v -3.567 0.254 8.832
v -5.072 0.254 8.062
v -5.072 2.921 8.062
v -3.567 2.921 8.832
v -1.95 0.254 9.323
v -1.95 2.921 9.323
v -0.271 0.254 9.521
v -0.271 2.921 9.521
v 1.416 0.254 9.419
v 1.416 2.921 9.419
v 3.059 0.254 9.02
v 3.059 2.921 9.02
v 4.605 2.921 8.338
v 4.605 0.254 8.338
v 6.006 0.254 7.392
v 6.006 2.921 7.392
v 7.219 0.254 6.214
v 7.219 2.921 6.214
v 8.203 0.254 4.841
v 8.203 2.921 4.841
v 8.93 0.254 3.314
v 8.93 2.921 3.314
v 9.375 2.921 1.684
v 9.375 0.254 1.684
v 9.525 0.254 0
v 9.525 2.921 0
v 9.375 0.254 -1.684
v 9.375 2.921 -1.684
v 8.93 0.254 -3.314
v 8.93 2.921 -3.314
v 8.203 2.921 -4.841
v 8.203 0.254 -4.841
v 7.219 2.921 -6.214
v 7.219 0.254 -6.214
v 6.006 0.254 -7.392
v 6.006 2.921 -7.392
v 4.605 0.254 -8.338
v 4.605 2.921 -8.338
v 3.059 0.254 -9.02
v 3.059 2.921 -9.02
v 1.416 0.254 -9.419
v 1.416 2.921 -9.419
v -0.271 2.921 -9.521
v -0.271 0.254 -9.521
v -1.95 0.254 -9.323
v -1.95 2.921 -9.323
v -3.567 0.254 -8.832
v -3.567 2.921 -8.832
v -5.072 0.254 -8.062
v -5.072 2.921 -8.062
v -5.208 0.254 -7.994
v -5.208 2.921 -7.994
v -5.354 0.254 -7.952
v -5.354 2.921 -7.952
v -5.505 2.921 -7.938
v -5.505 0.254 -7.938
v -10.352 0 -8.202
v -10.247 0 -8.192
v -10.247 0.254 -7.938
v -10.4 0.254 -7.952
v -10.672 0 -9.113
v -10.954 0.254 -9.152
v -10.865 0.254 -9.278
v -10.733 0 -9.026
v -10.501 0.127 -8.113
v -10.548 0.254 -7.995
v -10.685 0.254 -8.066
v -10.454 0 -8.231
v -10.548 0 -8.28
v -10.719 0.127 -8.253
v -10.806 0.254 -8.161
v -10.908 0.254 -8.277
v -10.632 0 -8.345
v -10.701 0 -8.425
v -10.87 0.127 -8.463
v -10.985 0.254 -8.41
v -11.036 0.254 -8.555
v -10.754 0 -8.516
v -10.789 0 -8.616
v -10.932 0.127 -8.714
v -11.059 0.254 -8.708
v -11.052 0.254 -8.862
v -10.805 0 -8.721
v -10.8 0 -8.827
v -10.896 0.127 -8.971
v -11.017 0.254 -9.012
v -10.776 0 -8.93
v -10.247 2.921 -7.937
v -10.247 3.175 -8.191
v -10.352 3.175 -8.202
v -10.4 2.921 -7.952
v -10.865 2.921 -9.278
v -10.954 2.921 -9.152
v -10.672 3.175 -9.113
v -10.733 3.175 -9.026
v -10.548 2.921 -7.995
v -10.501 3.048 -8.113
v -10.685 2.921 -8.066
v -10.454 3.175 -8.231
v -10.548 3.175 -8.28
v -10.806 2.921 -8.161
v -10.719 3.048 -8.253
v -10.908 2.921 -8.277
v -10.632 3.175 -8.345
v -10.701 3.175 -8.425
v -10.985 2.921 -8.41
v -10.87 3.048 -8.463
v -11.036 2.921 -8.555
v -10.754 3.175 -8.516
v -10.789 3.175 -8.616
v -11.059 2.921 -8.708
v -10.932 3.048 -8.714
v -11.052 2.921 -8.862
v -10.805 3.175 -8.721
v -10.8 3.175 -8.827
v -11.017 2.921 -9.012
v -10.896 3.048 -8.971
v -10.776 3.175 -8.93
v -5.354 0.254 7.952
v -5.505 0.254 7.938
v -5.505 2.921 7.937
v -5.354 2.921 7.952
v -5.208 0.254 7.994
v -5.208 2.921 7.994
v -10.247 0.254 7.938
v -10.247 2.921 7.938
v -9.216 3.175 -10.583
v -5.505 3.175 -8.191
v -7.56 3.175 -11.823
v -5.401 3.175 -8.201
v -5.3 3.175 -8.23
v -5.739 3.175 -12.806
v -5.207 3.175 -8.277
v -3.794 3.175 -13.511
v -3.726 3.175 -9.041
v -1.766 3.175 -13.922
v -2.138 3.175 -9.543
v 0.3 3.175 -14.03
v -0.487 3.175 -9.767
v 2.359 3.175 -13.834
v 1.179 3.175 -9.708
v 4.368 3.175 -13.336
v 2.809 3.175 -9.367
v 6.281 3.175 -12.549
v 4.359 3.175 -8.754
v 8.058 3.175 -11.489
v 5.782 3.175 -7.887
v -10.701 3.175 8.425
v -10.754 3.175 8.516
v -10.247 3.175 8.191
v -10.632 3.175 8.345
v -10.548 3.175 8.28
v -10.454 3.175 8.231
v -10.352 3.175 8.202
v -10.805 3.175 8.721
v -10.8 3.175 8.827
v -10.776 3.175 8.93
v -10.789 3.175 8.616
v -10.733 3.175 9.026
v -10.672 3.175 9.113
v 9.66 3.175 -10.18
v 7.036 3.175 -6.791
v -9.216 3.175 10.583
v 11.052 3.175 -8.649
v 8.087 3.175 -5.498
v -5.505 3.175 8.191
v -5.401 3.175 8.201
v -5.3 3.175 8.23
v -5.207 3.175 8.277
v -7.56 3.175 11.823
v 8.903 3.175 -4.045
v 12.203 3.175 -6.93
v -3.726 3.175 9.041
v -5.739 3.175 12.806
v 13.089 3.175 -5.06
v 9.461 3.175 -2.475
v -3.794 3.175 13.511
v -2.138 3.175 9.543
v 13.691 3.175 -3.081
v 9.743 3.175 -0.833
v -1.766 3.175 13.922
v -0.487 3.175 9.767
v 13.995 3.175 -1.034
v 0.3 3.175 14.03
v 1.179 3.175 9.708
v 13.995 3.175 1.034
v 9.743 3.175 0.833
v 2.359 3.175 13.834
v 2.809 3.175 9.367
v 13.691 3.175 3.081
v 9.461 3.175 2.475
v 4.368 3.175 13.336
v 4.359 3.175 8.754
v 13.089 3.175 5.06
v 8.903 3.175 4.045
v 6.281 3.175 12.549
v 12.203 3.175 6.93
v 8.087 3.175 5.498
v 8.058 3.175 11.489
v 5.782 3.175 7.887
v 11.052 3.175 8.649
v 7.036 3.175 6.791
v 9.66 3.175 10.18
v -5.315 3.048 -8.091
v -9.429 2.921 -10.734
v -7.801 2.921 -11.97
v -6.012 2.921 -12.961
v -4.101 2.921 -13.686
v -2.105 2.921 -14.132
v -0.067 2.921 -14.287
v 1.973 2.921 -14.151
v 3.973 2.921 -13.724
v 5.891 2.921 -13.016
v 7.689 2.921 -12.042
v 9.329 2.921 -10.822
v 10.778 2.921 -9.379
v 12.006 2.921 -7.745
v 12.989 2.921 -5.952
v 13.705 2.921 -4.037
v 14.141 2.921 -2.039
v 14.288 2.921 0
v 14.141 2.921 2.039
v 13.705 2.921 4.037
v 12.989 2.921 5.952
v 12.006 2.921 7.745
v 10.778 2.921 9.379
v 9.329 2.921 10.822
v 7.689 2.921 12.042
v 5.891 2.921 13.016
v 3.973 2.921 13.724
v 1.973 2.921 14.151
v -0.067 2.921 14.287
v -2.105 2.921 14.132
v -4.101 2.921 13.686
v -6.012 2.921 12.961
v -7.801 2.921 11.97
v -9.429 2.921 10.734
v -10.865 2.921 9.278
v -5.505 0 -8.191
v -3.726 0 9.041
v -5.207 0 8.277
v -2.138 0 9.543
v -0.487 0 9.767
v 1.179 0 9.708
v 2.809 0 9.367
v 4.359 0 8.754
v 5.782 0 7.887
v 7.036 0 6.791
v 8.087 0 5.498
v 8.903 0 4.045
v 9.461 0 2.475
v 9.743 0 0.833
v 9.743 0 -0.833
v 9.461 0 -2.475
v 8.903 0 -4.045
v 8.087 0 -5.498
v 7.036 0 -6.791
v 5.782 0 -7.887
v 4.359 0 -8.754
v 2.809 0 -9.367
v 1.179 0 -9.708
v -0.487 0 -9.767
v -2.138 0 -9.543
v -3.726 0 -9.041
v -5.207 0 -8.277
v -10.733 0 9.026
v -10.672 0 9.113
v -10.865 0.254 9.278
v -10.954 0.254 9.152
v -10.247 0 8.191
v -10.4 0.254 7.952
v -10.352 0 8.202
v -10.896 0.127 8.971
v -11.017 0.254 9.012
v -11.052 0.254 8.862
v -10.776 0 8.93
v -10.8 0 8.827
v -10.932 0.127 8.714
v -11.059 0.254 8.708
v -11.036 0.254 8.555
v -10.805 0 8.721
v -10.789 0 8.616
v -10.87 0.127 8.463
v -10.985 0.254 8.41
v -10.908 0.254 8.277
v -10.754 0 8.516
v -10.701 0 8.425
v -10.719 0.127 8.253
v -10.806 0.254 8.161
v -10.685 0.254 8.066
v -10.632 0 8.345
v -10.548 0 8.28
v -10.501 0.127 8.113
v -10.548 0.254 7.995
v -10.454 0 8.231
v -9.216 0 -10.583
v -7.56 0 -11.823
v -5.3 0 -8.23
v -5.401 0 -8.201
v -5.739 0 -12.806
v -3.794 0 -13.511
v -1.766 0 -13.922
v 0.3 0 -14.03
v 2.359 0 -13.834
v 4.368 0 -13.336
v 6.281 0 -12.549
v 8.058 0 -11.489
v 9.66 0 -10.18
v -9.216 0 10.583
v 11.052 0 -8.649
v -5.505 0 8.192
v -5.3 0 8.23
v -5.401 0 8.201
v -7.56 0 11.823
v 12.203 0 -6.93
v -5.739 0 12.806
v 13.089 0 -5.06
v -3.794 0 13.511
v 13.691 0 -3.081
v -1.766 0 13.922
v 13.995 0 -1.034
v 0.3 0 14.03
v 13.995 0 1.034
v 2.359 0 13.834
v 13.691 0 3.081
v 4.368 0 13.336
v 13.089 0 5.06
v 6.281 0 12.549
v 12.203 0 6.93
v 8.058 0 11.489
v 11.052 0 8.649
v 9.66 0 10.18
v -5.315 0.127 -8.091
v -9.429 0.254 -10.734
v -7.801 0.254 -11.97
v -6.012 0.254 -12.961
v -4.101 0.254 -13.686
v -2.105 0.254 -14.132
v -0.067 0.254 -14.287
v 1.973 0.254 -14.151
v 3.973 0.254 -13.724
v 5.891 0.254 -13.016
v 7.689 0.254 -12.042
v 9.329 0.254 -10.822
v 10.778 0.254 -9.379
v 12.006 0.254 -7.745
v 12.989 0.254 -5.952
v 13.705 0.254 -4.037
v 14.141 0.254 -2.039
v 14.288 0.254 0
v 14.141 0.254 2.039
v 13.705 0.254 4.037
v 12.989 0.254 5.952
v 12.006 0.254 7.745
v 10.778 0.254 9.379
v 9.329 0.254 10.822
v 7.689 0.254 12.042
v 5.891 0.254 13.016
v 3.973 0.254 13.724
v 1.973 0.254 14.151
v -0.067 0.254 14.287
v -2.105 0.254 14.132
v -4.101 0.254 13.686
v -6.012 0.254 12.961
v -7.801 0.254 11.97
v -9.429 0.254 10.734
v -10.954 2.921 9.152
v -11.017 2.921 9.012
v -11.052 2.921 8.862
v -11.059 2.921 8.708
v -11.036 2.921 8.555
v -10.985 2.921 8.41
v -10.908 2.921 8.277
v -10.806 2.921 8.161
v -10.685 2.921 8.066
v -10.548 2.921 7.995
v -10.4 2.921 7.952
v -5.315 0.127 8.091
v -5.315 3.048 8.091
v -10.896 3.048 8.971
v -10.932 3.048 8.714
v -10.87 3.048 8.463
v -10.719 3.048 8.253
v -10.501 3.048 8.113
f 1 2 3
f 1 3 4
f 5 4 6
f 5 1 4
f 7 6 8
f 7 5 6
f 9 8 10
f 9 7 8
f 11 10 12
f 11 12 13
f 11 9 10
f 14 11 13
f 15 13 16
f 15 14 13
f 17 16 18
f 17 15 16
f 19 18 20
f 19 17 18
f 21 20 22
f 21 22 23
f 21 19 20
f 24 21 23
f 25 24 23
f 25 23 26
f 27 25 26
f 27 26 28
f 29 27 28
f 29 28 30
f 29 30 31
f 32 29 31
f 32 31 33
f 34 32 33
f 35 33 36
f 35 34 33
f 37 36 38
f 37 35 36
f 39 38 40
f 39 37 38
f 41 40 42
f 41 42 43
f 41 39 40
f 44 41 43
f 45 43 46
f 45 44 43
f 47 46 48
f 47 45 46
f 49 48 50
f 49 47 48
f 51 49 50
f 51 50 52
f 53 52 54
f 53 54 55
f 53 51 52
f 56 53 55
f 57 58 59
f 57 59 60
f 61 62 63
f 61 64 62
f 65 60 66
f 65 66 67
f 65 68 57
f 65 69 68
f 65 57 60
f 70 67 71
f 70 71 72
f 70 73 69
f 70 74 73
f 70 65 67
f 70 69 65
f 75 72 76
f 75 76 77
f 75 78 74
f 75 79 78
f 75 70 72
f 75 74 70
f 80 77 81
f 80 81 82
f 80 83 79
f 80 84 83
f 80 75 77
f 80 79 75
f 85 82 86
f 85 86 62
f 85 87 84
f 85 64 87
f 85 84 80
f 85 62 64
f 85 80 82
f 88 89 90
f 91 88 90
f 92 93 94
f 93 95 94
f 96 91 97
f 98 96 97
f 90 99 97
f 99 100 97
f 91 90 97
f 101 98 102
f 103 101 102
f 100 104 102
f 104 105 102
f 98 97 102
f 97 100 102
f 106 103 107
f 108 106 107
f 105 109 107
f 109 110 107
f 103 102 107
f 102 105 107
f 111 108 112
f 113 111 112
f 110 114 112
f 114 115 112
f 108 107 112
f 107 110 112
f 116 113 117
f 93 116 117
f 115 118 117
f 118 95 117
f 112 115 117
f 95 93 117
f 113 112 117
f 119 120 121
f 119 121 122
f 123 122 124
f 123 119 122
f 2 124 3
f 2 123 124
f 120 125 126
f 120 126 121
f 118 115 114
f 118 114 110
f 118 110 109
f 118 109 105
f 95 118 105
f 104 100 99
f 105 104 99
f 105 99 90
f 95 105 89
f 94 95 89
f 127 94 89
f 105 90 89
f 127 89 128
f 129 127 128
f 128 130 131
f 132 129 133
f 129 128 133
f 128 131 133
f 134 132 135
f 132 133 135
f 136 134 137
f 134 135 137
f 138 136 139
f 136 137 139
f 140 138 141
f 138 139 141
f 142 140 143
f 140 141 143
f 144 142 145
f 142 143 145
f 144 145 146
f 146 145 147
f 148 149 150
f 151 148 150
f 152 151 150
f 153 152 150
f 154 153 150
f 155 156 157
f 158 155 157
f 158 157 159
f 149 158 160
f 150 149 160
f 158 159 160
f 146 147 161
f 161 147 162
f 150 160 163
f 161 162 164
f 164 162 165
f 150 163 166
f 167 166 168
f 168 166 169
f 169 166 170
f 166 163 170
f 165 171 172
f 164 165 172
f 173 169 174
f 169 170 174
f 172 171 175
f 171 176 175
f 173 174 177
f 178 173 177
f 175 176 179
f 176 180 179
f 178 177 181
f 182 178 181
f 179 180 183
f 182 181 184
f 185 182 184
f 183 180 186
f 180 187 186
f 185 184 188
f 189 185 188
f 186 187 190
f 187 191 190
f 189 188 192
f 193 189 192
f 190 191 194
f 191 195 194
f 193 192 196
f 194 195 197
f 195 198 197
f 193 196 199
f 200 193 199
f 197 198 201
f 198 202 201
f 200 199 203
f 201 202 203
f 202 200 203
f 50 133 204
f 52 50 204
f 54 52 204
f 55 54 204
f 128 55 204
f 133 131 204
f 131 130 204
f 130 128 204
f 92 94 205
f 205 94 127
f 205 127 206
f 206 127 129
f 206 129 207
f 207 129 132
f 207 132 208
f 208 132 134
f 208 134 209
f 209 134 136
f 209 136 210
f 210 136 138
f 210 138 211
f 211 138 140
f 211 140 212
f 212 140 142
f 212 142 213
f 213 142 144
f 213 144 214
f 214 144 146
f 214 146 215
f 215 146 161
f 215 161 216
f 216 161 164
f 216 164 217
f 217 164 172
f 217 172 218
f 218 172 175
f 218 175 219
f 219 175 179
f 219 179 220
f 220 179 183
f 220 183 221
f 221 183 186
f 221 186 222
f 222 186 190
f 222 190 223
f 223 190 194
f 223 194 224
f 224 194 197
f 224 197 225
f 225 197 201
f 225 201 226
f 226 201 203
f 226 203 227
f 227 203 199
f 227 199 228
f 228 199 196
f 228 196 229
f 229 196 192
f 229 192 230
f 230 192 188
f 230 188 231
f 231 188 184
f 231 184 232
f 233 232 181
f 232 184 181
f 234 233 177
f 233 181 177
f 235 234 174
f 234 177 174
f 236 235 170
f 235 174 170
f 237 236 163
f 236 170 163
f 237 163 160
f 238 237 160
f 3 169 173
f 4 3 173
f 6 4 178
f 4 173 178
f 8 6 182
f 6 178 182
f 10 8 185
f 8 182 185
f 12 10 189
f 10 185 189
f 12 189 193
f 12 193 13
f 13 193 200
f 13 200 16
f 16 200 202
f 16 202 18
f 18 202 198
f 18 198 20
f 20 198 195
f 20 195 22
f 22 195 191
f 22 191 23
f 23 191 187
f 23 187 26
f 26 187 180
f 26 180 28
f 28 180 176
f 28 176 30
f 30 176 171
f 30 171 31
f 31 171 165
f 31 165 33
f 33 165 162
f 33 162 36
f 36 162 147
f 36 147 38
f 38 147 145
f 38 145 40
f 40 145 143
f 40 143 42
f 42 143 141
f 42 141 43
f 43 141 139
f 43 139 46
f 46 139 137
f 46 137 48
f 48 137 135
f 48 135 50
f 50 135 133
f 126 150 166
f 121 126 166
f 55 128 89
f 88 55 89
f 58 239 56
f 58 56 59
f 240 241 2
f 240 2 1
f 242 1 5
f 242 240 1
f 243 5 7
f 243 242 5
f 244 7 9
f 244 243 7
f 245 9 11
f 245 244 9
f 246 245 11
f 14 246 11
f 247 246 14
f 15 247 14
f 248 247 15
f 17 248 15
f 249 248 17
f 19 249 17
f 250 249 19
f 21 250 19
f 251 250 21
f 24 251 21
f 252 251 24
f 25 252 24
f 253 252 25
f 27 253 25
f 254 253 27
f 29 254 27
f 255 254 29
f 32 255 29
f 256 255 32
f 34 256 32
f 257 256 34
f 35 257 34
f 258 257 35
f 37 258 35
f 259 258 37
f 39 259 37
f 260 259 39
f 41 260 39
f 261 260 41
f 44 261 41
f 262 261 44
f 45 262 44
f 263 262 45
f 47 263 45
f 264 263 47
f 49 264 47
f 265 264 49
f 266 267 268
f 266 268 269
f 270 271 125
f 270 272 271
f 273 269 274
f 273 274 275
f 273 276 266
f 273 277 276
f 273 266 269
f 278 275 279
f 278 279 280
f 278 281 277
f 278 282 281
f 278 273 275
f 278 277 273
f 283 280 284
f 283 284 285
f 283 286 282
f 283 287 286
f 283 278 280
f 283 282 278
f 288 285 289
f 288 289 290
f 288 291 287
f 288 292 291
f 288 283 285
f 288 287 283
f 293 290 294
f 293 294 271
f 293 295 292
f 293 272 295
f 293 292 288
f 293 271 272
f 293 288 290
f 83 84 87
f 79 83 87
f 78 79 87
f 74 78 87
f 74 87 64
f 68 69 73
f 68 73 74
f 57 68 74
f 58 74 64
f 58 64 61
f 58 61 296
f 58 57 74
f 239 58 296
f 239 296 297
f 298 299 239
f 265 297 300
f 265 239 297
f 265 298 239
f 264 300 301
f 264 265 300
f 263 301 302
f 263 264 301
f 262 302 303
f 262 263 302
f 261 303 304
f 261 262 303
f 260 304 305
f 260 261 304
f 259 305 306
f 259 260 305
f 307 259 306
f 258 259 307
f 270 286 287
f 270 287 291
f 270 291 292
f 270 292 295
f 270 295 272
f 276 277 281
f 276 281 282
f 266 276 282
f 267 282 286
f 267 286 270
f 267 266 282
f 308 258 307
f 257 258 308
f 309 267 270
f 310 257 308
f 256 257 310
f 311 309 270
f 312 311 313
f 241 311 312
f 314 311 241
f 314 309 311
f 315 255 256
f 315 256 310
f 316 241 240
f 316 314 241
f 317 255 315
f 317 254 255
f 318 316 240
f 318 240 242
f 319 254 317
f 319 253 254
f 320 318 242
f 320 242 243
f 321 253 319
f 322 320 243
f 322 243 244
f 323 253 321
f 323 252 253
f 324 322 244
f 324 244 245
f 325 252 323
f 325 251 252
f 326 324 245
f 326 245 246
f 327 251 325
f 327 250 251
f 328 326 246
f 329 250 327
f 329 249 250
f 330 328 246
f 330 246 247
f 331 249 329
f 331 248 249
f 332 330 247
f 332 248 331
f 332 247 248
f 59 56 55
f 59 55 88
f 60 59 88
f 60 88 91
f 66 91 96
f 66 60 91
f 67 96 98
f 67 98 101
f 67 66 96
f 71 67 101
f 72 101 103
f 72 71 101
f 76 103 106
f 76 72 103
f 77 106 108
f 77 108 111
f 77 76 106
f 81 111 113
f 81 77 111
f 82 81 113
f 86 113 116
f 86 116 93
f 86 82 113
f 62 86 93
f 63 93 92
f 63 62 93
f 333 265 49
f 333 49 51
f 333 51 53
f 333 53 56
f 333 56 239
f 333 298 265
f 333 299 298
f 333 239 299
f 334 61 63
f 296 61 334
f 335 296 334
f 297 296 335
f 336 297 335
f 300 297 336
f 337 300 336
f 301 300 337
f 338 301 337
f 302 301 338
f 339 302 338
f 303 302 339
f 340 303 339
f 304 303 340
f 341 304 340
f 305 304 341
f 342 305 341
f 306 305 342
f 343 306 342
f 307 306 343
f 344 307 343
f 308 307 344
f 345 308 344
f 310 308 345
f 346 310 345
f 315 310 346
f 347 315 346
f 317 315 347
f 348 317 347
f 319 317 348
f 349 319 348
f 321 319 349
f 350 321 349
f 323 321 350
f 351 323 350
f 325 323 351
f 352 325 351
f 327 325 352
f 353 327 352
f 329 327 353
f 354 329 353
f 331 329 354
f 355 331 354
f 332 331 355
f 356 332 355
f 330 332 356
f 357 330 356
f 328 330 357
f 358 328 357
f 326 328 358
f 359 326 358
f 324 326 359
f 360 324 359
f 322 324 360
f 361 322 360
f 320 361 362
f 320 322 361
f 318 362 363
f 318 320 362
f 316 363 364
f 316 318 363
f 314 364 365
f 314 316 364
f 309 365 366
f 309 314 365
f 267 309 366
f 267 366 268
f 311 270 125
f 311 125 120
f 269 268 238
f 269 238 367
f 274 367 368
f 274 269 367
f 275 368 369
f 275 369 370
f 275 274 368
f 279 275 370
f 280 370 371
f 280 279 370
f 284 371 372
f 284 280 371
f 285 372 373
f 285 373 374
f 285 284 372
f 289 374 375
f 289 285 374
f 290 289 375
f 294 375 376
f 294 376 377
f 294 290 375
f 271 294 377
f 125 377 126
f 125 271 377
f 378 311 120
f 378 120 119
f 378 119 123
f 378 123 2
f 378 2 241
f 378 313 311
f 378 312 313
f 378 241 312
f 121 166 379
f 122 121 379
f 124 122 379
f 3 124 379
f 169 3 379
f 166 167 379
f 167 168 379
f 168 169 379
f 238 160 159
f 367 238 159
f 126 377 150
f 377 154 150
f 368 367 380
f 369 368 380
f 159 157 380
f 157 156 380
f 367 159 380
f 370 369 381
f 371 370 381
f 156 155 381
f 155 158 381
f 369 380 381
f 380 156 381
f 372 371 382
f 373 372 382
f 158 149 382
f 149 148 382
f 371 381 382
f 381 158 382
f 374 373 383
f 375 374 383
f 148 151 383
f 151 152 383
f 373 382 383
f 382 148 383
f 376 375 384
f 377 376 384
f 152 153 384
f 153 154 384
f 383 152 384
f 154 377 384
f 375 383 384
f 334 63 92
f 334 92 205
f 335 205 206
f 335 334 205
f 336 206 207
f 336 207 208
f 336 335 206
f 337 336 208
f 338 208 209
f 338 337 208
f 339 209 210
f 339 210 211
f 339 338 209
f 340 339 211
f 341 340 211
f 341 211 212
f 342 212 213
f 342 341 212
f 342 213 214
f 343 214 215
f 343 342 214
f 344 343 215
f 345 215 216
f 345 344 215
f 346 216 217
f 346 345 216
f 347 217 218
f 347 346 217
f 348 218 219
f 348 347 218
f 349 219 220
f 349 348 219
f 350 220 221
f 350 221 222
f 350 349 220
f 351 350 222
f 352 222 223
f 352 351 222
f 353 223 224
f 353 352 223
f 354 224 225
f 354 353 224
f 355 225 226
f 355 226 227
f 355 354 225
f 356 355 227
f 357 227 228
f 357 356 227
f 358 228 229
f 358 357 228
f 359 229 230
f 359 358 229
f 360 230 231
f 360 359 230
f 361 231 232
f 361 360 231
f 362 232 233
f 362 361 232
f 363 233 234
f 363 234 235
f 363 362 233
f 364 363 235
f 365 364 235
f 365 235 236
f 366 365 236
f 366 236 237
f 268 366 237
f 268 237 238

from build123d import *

# Parameters (mm, degrees)
F1_DEPTH = 3.175
F2_SIZE  = 0.254


with BuildPart() as f1:
    # F0 (on Front) → F1 (new body)
    with BuildSketch(Plane.XZ):
        with BuildLine():
            ThreePointArc((-10.246941, -7.9375), (-10.985066, -8.409984), (-10.865041, -9.278122))
            ThreePointArc((-10.865041, -9.278122), (14.2875, 0), (-10.865041, 9.278122))
            ThreePointArc((-10.865041, 9.278122), (-10.985066, 8.409984), (-10.246941, 7.9375))
            Line((-10.246941, 7.9375), (-5.504758, 7.9375))
            ThreePointArc((-5.504758, 7.9375), (-5.279535, 7.969327), (-5.071951, 8.062316))
            ThreePointArc((-5.071951, 8.062316), (9.525, 0), (-5.071951, -8.062316))
            ThreePointArc((-5.071951, -8.062316), (-5.279535, -7.969327), (-5.504758, -7.9375))
            Line((-5.504758, -7.9375), (-10.246941, -7.9375))
        make_face()
    extrude(amount=-F1_DEPTH)

    # F2
    f2_edges = [f1.edges().sort_by_distance(p)[0] for p in [
        (9.525, 0, 0),
        (9.525, 3.175, 0),
    ]]
    chamfer(f2_edges, length=F2_SIZE)


solid = f1.part
